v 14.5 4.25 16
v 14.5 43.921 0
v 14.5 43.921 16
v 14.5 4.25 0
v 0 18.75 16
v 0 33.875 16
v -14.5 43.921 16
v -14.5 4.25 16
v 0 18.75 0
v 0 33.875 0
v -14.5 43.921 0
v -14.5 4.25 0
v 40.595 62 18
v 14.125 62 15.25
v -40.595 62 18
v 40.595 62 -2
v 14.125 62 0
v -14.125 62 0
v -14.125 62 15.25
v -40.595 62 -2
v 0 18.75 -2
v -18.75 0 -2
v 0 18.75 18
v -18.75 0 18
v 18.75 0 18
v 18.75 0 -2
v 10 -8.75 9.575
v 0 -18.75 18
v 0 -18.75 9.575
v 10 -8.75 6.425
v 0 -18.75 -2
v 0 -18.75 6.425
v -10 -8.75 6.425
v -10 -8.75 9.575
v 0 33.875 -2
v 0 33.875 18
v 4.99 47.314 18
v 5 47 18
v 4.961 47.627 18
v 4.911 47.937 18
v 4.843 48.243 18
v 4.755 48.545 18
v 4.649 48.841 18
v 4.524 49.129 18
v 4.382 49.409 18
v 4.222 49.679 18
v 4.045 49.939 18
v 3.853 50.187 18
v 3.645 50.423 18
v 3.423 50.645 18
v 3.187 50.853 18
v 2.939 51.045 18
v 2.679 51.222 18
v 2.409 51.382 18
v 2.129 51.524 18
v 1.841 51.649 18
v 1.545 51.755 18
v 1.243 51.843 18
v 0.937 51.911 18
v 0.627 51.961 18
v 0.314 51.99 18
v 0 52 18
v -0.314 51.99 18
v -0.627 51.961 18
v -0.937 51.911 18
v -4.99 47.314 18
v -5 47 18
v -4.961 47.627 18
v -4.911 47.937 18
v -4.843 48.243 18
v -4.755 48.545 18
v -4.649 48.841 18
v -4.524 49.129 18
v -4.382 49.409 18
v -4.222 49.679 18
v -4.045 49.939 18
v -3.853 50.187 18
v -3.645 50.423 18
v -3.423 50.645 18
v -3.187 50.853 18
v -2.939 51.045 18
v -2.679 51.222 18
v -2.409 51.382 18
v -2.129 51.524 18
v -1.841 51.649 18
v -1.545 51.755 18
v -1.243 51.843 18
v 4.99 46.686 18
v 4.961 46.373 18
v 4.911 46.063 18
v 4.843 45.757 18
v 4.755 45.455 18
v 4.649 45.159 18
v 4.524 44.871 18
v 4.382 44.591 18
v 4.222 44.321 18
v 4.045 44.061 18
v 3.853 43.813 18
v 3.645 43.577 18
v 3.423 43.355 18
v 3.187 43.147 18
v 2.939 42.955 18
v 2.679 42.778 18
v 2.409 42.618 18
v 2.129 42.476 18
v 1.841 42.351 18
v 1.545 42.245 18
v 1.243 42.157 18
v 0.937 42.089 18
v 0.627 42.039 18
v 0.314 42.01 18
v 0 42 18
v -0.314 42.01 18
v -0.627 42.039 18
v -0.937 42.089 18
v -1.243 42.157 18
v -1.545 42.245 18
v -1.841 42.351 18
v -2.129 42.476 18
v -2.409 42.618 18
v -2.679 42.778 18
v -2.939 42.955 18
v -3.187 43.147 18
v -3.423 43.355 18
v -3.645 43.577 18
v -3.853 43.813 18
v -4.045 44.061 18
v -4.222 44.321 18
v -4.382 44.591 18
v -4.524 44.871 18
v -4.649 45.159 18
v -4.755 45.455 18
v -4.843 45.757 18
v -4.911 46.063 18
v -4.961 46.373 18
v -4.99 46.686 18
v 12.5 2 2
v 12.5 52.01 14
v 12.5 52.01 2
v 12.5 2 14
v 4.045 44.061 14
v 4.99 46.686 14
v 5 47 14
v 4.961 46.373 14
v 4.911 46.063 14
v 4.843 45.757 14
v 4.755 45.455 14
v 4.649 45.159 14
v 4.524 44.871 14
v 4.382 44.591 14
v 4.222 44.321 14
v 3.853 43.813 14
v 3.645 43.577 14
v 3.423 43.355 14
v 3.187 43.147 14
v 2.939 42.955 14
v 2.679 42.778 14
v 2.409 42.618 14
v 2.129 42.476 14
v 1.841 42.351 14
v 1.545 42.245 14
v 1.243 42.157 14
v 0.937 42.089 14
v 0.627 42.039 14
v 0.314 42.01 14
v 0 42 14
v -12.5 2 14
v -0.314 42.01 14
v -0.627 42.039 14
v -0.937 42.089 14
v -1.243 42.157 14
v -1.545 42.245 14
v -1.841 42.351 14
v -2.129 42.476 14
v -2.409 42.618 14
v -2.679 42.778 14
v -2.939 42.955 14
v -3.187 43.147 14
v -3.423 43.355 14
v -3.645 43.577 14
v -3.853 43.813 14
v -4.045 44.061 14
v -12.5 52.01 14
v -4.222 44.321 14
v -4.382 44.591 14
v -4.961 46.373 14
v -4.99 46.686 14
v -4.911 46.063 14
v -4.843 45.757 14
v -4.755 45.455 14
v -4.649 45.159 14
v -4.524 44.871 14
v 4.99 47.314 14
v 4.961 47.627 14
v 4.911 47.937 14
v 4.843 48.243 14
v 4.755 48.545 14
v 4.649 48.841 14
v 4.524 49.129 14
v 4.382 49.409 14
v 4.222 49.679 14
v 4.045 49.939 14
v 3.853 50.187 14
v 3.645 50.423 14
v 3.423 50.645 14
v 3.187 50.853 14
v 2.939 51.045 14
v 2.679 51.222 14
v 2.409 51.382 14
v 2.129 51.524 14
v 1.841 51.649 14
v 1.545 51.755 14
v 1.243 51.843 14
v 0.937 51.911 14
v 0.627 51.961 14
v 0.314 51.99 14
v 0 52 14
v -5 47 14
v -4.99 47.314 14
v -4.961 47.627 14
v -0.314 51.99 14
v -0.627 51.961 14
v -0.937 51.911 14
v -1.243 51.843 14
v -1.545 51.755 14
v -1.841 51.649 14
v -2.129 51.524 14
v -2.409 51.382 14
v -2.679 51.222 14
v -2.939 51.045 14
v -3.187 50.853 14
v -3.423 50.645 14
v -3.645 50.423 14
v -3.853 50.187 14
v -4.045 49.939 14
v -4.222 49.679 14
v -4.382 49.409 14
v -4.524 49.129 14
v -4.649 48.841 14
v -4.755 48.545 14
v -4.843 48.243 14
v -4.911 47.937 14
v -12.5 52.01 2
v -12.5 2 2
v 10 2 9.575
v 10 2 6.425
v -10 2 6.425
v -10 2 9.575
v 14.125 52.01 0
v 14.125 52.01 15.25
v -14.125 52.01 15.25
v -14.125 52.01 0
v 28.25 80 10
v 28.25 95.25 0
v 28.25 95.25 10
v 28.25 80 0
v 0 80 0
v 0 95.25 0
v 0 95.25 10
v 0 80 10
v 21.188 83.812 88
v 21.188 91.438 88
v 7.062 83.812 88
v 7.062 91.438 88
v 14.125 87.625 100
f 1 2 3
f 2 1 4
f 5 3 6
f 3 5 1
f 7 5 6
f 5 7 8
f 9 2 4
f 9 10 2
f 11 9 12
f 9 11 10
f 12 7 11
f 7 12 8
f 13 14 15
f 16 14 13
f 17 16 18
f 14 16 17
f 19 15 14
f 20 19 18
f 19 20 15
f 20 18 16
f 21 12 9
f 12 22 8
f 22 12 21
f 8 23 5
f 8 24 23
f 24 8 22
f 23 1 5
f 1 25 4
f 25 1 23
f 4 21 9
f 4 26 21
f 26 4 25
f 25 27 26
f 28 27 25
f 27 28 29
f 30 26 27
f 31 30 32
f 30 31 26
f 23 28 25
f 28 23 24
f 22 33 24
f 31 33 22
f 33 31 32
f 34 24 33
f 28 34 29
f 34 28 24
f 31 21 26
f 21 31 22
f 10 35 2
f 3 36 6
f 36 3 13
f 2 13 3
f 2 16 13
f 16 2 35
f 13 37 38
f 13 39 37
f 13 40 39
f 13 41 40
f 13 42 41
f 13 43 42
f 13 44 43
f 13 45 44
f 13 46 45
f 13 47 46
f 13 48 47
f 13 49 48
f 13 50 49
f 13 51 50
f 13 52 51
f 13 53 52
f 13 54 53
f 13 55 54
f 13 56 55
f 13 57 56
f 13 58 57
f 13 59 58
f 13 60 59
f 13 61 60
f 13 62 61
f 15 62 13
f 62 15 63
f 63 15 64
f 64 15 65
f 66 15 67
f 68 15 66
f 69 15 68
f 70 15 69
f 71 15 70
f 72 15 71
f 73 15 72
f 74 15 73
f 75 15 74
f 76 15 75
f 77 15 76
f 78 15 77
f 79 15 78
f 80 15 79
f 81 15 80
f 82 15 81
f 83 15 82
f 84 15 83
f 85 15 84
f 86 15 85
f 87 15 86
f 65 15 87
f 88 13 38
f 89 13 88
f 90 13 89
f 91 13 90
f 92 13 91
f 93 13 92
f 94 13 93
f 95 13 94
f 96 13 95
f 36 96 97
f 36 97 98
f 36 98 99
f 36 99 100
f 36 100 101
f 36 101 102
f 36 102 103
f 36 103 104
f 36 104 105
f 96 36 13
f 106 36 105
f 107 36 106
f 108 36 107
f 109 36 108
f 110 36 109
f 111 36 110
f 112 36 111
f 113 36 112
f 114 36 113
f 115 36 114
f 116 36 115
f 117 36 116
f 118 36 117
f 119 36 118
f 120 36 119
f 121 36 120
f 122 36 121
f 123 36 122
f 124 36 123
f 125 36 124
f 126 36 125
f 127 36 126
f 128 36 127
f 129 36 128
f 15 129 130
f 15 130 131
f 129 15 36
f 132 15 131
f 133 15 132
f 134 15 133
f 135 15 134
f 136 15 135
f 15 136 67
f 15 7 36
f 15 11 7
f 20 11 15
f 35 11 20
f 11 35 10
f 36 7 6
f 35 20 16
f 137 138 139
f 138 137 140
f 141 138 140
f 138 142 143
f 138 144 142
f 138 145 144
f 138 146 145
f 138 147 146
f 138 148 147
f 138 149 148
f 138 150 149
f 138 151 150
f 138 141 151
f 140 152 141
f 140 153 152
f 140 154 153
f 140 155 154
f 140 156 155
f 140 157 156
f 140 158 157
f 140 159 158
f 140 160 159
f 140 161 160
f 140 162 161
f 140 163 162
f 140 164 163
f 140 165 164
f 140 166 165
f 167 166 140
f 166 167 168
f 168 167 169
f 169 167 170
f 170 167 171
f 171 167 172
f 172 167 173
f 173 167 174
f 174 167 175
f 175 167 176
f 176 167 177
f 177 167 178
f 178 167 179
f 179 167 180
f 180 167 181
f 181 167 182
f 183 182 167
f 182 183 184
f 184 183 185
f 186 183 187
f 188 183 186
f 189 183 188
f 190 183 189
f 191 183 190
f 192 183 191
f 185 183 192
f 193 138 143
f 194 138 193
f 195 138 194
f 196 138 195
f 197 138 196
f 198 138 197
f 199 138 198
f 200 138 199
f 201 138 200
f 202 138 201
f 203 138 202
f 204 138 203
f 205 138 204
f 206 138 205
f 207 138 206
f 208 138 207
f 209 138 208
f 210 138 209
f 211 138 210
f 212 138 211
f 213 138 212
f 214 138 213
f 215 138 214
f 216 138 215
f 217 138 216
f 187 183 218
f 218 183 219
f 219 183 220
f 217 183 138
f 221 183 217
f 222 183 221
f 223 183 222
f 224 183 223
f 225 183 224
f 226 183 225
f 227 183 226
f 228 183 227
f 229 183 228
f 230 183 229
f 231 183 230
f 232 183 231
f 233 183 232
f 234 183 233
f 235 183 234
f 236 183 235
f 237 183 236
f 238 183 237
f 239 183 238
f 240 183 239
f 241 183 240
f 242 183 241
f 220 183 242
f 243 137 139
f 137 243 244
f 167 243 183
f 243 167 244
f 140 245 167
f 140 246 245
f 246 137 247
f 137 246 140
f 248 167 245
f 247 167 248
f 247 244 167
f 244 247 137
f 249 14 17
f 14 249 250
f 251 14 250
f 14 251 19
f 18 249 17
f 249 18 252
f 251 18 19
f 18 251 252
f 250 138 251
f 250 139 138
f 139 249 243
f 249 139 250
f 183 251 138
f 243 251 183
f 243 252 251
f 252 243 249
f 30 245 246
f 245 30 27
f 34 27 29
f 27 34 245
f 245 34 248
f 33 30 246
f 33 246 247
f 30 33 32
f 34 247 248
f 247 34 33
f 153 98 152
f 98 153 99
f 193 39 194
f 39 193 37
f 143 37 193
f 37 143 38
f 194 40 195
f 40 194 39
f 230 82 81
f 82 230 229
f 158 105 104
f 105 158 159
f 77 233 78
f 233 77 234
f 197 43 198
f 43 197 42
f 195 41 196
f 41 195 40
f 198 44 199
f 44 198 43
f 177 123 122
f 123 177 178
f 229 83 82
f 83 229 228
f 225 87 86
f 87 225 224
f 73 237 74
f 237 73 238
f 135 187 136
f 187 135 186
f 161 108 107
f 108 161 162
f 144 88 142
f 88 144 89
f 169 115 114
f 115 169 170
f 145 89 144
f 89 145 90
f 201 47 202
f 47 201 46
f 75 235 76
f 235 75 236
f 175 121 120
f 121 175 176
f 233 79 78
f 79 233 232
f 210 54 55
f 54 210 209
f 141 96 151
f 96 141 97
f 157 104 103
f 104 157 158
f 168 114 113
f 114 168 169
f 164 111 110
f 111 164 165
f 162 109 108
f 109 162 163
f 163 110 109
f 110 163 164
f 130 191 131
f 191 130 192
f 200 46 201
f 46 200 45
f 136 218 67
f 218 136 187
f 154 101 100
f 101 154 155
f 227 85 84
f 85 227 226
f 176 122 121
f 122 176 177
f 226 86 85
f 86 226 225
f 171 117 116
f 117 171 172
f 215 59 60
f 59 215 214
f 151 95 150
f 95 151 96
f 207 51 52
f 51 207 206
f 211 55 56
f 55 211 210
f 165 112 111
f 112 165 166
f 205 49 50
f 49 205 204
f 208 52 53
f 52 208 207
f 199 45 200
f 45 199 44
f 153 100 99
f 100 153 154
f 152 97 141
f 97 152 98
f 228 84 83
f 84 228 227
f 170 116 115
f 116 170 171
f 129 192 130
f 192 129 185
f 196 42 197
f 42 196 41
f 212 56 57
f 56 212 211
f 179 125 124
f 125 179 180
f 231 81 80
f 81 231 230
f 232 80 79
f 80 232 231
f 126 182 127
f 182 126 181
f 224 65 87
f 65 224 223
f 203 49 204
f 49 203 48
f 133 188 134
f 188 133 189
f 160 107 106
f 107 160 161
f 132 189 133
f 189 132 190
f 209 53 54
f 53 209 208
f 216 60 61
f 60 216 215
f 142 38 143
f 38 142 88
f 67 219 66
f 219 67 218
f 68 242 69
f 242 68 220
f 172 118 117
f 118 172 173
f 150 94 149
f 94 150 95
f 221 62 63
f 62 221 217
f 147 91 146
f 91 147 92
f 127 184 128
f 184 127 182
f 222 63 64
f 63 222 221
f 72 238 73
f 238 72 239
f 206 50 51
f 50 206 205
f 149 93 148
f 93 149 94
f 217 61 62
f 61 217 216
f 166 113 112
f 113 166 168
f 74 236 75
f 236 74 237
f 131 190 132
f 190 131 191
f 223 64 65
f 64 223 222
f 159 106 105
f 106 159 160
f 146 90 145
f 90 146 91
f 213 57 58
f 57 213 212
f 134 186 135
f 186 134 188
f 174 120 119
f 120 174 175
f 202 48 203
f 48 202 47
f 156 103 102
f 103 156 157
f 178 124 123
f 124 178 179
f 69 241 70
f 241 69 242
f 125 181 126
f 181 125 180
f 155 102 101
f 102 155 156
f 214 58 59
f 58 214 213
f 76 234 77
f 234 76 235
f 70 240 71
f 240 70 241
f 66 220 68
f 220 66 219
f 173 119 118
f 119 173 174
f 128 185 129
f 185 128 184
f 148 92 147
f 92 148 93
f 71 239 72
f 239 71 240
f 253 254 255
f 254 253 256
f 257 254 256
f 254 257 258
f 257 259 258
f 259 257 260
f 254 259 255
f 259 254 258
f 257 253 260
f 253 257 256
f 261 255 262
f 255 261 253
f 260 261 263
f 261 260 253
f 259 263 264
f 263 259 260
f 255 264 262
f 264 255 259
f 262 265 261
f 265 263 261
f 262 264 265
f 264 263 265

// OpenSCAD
bay_dim=[25,60,12];
batt_dim=[20,30,3.15];
handle_walls=2;
sigma=0.01;
details=2;
blade_inset=10;
button_d=10;
$fn=100;

handle_top=bay_dim.y+handle_walls;
mid_dim=[bay_dim.x+handle_walls*2,handle_top,bay_dim.z+handle_walls*2];
hilt_w=bay_dim.x*0.75;
outer_handle_h=bay_dim.z+handle_walls*2+details*2;
blade_wiggle=0.75;
blade_w=bay_dim.x+handle_walls*2-blade_wiggle;
blade_t=bay_dim.z+handle_walls*2-blade_wiggle;
blade_h=100;
blade_tip=12;
blade_real_h=blade_h-blade_tip;
blade_sleekness=0.5;

module fcube(bs,ts,h)
{
	xoff=(bs.x-ts.x)/2;
	yoff=(bs.y-ts.y)/2;

	verts=
	[
		[0,0,0], 
		[bs.x,0,0], 
		[bs.x,bs.y,0], 
		[0,bs.y,0], 
		[xoff,yoff,h], 
		[xoff+ts.x,yoff,h], 
		[xoff+ts.x,yoff+ts.y,h], 
		[xoff,yoff+ts.y,h]
	];

	faces=
	[
		[0,1,2,3],
		[4,5,1,0],
		[7,6,5,4],
		[5,6,2,1],
		[6,7,3,2],
		[7,4,0,3]
	];

	polyhedron(verts,faces);
}

module cr2032_slot()
{
	cube(size=batt_dim);
}

module bay()
{
	translate([-(bay_dim.x+handle_walls*2)/2+handle_walls,handle_walls,handle_walls])
		cube(size=bay_dim);
}

module handle()
{
	difference()
	{
		union()
		{
			translate([-mid_dim.x/2,0,0])
				cube(size=mid_dim);

			translate([0,0,-details])
				cylinder($fn=4,h=bay_dim.z+handle_walls*2+details*2,r=hilt_w);

			//(bay_dim.x-hilt_w)/2
			translate([0,handle_top-hilt_w/2,-details])
				rotate([0,0,270])
					scale([1,2.5,1])
						cylinder($fn=3,h=outer_handle_h,r=hilt_w);
		}

		union()
		{
			translate([-mid_dim/2,0,0])
			{
				bay();

				translate([-blade_w/2,handle_top+sigma-blade_inset,0])
					cube([blade_w,blade_inset,blade_t]);

				translate([-batt_dim.x/2,-(hilt_w+sigma),(mid_dim.z-batt_dim.z)/2])
					cr2032_slot();
			}

			translate([0,handle_top-blade_inset-button_d/2,handle_walls])
				cylinder(d=button_d,h=outer_handle_h-handle_walls-details+sigma);
		}
	}
}

module blade()
{
	cube([blade_w,blade_t,blade_inset]);

	bs=[blade_w,blade_t];
	ts=[blade_w*blade_sleekness,blade_t*blade_sleekness];
	translate([0,0,blade_inset])
		fcube(bs=bs,ts=ts,h=blade_real_h-blade_inset);
	
	verts=
	[
		[ts.x,ts.y,0],
		[ts.x,0,0],
		[0,0,0],
		[0,ts.y,0],
		[ts.x/2,ts.y/2,blade_tip]
	];

	faces=
	[
		[0,1,4],
		[1,2,4],
		[2,3,4],
		[3,0,4],
		[1,0,3],
		[2,1,3]
	];
  
	translate([(bs.x-ts.x)/2,(bs.y-ts.y)/2,blade_real_h])
		polyhedron(verts,faces);
}

handle();
translate([0,80,0])
	blade();
